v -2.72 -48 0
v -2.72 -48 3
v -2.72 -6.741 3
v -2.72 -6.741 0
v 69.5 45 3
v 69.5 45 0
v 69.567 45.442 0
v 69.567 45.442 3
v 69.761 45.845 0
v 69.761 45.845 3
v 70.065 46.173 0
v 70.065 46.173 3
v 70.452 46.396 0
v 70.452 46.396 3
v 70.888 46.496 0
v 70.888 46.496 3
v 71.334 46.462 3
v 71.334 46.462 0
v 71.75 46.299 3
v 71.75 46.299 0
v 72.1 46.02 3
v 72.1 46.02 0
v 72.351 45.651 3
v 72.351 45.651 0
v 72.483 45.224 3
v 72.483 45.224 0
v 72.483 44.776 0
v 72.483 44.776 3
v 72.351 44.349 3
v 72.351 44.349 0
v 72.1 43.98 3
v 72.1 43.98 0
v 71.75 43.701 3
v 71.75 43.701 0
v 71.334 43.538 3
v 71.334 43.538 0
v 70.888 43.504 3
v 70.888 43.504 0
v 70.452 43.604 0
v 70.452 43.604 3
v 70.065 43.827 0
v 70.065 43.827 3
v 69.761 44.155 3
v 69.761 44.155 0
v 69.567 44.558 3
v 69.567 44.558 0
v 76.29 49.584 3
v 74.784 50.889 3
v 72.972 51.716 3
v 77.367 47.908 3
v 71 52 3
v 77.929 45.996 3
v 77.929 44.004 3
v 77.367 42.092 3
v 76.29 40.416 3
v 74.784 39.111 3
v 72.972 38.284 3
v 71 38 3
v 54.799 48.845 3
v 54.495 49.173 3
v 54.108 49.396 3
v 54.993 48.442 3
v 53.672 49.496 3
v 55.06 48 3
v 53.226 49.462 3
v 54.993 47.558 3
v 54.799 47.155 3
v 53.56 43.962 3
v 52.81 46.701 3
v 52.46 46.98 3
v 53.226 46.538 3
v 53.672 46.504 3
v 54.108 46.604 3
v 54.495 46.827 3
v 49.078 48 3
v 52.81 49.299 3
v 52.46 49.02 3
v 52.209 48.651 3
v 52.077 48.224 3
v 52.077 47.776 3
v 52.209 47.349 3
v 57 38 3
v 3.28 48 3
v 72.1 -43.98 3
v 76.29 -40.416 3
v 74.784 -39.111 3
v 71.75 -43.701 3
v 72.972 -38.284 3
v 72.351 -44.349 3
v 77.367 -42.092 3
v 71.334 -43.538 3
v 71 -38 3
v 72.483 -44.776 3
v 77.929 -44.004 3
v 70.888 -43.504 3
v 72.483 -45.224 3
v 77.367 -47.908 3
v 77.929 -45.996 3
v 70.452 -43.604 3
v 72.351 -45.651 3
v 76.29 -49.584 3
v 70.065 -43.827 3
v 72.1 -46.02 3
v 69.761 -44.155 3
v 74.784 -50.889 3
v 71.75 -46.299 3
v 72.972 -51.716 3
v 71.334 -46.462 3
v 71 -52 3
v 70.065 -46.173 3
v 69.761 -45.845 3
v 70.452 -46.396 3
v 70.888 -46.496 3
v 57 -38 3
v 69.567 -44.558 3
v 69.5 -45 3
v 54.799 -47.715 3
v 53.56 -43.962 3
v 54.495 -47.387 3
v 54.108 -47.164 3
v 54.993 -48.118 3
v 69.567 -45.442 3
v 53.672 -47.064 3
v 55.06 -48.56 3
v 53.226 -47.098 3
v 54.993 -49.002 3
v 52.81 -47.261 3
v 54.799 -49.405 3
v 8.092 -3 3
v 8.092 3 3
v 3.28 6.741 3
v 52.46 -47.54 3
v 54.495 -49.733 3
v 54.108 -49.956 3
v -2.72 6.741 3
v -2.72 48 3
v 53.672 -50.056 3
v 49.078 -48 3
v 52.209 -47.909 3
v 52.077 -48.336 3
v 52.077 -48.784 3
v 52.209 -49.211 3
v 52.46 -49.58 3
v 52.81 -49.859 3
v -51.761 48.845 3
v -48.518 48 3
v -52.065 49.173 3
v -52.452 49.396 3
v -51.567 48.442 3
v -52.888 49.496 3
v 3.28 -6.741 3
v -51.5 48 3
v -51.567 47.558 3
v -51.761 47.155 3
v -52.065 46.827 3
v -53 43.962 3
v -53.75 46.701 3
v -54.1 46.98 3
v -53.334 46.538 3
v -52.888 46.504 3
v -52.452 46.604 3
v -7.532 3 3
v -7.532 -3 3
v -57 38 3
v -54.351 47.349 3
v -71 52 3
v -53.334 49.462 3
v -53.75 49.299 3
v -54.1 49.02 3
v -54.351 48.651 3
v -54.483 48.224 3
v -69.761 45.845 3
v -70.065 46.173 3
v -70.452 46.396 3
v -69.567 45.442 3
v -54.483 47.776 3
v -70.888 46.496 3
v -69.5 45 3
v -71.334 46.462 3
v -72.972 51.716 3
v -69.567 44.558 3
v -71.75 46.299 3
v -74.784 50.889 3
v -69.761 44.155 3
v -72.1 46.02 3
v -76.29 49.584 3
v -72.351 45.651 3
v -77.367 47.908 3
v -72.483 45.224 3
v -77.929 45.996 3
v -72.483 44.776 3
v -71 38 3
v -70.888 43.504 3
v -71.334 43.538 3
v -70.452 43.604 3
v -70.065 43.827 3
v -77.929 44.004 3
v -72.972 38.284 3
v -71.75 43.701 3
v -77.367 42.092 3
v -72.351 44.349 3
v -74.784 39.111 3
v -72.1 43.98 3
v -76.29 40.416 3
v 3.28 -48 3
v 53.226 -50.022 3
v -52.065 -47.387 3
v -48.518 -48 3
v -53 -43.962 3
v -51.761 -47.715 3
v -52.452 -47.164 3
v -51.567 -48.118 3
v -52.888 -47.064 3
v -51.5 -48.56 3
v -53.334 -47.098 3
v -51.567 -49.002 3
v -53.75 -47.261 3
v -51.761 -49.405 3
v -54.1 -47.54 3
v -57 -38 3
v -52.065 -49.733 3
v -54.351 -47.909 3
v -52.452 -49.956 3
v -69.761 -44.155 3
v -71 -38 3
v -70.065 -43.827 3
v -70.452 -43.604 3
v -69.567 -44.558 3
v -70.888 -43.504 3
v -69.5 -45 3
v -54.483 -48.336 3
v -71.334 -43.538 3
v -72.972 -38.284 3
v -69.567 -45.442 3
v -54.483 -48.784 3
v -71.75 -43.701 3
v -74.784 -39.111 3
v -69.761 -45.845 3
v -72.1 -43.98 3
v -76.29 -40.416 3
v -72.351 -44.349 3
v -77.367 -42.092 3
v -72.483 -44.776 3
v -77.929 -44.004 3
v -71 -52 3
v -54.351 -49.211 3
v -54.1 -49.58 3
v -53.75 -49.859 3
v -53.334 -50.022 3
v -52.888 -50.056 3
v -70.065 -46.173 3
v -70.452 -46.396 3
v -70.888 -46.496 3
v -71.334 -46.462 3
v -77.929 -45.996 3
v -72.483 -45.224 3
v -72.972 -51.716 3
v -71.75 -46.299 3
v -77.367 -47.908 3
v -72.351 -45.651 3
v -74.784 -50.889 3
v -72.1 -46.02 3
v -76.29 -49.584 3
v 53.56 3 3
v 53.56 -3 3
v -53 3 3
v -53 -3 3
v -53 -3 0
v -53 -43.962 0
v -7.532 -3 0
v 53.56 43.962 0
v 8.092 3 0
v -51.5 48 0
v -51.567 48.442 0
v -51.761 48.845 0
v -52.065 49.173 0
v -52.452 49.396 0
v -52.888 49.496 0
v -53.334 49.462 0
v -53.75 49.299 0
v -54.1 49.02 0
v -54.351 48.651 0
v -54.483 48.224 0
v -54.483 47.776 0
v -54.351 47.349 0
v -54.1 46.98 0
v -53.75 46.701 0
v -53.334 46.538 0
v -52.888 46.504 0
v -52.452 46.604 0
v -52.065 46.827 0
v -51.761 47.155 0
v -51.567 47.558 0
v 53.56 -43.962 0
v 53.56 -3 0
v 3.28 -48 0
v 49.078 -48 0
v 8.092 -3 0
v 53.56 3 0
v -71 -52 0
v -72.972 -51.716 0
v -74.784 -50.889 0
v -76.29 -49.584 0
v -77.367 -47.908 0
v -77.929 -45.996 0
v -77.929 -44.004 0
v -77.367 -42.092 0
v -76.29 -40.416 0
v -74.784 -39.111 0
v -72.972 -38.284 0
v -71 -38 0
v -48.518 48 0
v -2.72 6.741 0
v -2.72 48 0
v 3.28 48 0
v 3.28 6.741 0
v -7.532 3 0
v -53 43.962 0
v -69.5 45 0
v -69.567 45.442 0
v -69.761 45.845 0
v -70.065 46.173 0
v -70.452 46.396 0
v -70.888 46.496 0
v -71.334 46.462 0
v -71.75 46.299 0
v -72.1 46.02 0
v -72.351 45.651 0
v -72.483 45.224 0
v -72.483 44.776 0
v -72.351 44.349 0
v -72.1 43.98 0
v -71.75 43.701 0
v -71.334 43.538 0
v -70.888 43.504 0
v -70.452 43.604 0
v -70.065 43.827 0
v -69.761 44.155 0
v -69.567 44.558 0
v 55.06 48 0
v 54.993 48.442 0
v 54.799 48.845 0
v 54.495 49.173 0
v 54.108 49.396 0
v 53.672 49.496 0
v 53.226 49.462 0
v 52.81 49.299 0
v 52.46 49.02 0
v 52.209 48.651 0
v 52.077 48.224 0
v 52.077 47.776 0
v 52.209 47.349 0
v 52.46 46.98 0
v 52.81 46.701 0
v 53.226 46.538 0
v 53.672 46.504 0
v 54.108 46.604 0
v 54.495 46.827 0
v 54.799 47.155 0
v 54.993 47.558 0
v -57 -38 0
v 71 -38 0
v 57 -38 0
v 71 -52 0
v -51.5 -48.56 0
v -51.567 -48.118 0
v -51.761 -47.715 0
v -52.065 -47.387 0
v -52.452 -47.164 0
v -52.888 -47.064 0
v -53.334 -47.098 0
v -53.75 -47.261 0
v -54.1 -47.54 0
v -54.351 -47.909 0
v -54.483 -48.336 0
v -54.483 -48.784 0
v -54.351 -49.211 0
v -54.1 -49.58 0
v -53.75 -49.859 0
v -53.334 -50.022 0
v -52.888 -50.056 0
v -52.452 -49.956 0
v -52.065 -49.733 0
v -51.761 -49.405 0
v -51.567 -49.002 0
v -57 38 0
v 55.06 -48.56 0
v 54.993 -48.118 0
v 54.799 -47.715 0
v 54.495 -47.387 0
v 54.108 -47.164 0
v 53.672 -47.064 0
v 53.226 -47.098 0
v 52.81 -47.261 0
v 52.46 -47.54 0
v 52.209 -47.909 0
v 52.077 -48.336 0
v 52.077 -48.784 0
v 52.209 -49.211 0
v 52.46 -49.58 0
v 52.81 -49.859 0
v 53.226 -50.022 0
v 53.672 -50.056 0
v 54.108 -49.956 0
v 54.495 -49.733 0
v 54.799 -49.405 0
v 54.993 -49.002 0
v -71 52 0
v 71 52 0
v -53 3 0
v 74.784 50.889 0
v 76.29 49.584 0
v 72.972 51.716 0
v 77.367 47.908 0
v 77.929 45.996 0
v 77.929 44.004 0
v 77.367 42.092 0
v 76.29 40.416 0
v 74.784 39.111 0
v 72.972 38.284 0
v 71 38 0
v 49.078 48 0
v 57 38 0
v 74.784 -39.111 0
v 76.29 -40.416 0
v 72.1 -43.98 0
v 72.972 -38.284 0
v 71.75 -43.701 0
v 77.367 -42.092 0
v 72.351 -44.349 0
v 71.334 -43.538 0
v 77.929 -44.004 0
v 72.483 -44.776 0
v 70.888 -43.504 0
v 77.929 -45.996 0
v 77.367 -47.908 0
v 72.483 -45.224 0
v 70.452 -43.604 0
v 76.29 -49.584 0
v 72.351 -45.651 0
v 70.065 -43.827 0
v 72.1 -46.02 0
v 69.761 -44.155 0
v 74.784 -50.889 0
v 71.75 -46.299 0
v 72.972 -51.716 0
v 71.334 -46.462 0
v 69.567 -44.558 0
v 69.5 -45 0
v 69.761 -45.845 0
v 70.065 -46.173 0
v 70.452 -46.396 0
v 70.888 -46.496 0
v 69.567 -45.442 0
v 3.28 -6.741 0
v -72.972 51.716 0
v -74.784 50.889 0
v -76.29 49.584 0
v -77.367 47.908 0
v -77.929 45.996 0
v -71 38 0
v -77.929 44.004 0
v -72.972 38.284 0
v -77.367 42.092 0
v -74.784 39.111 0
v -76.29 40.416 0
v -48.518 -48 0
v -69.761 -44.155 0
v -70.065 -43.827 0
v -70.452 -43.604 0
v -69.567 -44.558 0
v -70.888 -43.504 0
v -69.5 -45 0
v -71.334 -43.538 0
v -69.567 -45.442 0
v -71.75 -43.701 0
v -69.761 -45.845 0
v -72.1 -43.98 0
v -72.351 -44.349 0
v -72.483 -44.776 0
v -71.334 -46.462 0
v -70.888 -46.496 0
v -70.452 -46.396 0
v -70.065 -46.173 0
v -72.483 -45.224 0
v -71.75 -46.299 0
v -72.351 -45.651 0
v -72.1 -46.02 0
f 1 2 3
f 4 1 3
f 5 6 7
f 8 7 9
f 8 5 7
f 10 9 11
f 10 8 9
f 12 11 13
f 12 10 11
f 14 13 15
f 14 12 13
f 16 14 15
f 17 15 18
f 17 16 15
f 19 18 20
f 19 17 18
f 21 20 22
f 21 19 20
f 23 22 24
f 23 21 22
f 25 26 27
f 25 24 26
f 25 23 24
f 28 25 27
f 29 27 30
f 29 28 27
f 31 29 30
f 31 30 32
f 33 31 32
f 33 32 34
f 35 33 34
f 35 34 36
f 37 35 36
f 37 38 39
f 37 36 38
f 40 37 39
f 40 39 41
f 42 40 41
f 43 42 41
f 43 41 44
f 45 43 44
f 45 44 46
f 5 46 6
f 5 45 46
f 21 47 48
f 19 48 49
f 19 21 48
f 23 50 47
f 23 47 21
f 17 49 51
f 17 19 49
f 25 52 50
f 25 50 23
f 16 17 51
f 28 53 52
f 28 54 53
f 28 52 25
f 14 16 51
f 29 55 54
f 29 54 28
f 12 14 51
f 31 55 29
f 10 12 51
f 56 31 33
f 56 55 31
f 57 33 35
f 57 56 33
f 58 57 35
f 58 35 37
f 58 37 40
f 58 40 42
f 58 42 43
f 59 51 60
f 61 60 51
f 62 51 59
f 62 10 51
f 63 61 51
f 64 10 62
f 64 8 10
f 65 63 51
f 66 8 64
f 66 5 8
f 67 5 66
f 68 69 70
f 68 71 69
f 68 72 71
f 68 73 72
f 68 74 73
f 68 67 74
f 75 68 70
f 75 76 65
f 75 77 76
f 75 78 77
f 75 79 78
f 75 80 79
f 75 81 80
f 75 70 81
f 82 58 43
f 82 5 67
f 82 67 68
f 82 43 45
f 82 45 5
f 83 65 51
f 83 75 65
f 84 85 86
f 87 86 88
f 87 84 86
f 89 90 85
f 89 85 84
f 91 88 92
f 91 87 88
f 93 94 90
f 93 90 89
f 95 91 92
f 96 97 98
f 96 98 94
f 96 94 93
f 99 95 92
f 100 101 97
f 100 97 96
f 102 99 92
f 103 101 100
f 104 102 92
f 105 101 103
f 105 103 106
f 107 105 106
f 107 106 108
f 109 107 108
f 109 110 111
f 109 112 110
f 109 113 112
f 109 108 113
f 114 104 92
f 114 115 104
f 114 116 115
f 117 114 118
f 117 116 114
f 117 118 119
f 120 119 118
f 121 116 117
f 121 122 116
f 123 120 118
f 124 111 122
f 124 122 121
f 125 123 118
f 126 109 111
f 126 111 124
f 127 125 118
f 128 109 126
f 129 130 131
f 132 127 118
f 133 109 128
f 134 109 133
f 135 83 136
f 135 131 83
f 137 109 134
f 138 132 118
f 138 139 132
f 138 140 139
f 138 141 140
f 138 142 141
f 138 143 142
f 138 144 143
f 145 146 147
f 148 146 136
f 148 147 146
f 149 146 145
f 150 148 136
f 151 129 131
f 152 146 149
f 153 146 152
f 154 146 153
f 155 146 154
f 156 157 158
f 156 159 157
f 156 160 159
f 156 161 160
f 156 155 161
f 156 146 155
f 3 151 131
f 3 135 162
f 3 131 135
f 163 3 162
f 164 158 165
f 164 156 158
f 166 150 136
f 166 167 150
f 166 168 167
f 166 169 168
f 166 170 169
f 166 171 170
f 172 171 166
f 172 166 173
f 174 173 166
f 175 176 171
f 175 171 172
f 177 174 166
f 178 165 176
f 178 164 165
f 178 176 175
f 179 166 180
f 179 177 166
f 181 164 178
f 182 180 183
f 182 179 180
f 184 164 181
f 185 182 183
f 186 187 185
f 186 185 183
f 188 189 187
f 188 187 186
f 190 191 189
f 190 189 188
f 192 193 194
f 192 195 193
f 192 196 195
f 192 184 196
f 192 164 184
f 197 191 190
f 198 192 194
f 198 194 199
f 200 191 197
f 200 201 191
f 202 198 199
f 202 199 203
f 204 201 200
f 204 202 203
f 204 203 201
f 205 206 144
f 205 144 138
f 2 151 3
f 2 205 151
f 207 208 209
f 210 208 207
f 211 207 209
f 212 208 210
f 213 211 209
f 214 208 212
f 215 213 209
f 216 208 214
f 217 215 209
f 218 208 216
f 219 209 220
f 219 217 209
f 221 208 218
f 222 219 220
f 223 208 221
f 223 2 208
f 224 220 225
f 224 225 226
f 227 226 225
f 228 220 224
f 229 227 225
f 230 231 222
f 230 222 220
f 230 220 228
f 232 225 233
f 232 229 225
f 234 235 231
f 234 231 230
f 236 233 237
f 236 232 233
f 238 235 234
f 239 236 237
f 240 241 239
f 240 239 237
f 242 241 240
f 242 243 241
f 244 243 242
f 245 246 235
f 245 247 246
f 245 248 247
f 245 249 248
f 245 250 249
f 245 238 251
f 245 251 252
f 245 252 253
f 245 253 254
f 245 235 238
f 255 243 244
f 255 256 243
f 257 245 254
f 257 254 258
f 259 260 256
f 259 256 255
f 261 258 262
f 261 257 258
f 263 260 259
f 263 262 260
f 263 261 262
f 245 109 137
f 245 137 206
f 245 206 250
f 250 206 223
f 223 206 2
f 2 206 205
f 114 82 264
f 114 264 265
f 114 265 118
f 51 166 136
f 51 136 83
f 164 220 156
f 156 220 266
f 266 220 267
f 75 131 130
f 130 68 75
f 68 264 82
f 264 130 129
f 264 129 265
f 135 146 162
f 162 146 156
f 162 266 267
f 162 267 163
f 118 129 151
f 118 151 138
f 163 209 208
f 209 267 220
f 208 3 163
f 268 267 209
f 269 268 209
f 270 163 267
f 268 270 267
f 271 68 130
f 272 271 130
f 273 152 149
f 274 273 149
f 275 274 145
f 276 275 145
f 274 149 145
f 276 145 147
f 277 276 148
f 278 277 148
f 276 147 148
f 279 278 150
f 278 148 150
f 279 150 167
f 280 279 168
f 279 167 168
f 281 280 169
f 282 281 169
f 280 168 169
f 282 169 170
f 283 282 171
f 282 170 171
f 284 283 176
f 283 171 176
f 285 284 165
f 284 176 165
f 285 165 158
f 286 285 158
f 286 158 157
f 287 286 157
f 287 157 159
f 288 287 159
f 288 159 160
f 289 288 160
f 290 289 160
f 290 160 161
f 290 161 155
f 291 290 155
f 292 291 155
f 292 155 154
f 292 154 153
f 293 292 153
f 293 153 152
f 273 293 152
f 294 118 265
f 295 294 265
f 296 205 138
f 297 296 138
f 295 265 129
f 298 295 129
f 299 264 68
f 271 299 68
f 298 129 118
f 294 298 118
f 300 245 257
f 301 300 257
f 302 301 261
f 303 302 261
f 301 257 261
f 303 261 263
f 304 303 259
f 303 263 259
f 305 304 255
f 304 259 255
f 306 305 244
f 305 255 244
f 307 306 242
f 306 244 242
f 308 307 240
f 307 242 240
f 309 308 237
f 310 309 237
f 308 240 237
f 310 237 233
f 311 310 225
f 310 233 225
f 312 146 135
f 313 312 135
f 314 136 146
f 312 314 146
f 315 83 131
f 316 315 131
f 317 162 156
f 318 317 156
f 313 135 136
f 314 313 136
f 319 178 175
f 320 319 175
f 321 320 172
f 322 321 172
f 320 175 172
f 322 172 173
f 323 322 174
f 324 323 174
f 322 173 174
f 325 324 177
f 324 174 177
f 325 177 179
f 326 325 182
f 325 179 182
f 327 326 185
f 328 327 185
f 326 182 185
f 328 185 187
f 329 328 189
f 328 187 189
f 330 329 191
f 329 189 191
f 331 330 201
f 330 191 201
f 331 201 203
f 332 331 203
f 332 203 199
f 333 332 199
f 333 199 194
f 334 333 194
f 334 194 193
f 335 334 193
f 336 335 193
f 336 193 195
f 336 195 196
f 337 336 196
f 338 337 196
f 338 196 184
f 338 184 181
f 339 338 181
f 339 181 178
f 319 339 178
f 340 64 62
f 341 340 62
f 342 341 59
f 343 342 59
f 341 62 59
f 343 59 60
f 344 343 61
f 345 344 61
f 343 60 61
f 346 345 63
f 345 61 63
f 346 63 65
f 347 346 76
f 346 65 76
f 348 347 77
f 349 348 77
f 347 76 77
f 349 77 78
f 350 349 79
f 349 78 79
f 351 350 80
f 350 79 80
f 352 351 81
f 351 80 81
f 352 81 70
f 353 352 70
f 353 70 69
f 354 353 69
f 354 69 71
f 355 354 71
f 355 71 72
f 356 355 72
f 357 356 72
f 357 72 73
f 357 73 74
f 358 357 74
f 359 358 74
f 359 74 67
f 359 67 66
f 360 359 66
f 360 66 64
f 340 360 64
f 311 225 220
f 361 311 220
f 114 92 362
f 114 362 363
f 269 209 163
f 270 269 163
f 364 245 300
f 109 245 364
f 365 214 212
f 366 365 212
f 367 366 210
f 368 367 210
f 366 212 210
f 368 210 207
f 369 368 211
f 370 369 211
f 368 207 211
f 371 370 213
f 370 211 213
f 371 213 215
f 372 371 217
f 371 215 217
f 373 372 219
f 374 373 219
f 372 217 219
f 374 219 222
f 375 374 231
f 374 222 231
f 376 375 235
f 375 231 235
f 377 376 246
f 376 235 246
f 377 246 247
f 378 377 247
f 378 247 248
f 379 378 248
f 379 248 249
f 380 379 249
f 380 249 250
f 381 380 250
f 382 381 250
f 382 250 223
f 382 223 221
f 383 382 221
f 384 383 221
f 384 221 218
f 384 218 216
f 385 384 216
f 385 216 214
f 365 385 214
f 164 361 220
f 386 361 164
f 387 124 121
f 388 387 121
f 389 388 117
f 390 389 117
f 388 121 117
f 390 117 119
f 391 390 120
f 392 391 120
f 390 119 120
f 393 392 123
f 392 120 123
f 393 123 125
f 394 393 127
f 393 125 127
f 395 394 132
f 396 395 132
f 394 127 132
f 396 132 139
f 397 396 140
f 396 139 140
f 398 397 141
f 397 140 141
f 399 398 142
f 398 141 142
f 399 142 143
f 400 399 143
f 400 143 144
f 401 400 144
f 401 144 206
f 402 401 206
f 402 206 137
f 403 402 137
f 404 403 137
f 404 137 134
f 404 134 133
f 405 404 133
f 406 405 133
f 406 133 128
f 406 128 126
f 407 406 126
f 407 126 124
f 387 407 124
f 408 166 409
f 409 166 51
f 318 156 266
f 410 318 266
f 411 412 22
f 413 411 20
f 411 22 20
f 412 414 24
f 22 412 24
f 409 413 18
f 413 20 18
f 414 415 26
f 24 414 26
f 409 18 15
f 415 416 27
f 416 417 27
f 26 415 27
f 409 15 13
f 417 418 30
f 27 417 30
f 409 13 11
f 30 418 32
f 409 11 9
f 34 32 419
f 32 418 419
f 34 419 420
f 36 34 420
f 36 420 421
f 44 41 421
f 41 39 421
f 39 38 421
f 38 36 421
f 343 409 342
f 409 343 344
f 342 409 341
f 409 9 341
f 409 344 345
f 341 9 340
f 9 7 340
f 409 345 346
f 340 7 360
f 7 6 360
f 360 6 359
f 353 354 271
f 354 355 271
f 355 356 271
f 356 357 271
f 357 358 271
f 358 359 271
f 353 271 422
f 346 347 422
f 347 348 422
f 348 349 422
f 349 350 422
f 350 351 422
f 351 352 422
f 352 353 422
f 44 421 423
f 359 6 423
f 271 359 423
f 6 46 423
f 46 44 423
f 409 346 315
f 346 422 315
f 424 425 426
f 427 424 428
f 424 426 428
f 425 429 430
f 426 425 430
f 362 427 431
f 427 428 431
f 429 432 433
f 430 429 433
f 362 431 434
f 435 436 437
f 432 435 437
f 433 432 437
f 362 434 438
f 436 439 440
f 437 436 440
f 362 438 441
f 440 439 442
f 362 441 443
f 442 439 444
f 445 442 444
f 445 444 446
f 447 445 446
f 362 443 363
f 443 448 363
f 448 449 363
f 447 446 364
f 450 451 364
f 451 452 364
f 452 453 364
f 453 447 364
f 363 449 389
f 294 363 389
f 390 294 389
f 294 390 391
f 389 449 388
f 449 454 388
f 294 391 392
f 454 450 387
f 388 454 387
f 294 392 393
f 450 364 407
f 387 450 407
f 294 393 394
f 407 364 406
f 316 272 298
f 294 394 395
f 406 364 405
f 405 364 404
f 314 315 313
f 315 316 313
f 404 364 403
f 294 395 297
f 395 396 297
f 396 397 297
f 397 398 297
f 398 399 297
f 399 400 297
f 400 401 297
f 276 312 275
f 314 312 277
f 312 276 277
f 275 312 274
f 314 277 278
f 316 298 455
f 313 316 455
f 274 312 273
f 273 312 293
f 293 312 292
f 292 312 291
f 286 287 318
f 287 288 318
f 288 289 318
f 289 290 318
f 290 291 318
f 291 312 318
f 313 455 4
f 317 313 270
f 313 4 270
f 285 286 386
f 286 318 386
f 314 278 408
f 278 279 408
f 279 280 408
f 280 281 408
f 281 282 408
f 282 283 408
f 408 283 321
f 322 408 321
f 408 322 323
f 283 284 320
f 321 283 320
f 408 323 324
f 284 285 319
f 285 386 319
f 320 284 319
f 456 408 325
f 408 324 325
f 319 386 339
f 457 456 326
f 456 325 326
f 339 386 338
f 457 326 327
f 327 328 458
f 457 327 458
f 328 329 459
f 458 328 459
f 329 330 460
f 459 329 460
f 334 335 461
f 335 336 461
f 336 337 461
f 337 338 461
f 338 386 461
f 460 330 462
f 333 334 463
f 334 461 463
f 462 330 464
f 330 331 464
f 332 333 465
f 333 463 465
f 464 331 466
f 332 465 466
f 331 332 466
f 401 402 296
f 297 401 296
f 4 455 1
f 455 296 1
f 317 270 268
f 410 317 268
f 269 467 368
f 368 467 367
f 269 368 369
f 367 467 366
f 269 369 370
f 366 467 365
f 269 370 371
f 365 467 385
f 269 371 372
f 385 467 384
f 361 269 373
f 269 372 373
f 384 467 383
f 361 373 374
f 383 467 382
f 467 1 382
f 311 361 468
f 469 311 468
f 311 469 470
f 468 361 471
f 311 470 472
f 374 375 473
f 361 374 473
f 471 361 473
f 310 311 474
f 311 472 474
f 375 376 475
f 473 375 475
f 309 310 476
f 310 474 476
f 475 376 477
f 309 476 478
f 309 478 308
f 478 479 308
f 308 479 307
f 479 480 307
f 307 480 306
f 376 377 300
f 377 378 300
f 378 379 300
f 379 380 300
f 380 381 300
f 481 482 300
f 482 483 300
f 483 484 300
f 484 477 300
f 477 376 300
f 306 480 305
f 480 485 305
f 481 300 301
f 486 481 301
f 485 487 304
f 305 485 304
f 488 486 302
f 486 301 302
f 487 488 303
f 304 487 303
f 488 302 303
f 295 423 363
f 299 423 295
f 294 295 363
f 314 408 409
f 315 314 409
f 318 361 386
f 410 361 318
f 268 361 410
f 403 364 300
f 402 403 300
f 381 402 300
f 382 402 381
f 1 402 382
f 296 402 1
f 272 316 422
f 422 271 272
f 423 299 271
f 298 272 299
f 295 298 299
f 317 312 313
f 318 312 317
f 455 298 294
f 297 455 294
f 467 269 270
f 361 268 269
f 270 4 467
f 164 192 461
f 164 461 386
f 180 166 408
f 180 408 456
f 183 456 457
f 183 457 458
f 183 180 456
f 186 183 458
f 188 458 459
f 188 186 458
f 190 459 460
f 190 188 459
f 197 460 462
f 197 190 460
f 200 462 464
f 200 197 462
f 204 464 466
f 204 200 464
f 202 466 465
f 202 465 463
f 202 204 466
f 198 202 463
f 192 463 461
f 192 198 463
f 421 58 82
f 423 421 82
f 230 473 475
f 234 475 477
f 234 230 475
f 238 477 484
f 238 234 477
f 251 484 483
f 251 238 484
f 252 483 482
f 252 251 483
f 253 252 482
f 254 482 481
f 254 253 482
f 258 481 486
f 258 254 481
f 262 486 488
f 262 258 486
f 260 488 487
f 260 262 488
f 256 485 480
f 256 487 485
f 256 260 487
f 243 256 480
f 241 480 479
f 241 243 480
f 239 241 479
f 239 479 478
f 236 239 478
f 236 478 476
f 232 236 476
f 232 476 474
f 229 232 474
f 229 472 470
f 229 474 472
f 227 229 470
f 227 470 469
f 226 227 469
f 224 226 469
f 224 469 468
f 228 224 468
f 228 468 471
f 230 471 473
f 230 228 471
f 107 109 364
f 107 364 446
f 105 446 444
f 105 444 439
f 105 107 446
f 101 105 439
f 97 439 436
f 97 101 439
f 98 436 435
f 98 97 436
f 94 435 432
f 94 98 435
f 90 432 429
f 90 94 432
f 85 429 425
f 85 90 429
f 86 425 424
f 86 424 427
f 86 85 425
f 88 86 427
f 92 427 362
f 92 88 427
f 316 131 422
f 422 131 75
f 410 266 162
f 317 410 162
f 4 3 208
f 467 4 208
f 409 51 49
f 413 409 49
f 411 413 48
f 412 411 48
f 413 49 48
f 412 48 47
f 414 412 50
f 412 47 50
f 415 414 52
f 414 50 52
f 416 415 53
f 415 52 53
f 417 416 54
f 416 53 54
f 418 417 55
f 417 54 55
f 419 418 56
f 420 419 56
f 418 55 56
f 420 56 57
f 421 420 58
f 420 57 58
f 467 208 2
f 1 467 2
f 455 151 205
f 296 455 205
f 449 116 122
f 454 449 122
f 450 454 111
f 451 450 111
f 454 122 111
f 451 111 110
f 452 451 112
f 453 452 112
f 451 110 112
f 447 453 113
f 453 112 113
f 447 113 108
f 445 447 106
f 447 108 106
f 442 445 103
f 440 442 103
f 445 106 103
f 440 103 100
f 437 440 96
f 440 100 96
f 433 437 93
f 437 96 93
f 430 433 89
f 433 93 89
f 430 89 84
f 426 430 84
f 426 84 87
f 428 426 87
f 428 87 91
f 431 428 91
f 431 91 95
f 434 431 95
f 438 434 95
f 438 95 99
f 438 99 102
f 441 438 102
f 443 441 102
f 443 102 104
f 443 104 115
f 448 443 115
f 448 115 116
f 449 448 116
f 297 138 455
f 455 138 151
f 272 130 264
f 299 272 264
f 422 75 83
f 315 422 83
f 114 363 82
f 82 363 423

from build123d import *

# Parameters (mm, degrees)
SKETCH3_W                                  = 114
SKETCH3_H                                  = 104
BOSS_EXTRUDE1_DEPTH                        = 3
SKETCH4_R                                  = 1.5
CUT_EXTRUDE1_DEPTH                         = 78.21398837
LPATTERN1_COUNT                            = 2
LPATTERN1_PITCH                            = 106.56
LPATTERN1_COUNT_DIR2                       = 2
LPATTERN1_PITCH_DIR2                       = 96.56
BOSS_EXTRUDE2_DEPTH                        = 3
SKETCH6_R                                  = 1.5
CUT_EXTRUDE2_DEPTH                         = 94.79232378
MIRROR1_AT_THE_SECOND_PLANE_COPY_1_DEPTH   = 3
MIRROR1_AT_THE_SECOND_PLANE_COPY_2_SKETC_R = 1.5
MIRROR1_AT_THE_SECOND_PLANE_COPY_2_DEPTH   = 94.79232378
CUT_EXTRUDE3_DEPTH                         = 94.79232378


with BuildPart() as part:
    # Sketch3 → Boss-Extrude1 (new body)
    with BuildSketch(Plane.XY):
        Rectangle(SKETCH3_W, SKETCH3_H)
    extrude(amount=BOSS_EXTRUDE1_DEPTH)

    # Sketch4 → Cut-Extrude1 (cut, through all)
    with BuildSketch(Plane.XY.offset(3)):
        with Locations((-53, 48)):
            Circle(SKETCH4_R)
    cut_extrude1 = extrude(amount=-CUT_EXTRUDE1_DEPTH, mode=Mode.SUBTRACT)

    # LPattern1: Cut-Extrude1 2 × 2
    with Locations(*[(i * LPATTERN1_PITCH, -j * LPATTERN1_PITCH_DIR2, 0) for i in range(LPATTERN1_COUNT) for j in range(LPATTERN1_COUNT_DIR2) if (i, j) != (0, 0)]):
        add(cut_extrude1, mode=Mode.SUBTRACT)

    # Sketch5 → Boss-Extrude2 (add)
    with BuildSketch(Plane.XY.offset(3)):
        with BuildLine():
            Line((-57, 52), (-71, 52))
            ThreePointArc((-71, 52), (-78, 45), (-71, 38))
            Line((-71, 38), (-57, 38))
            Line((-57, 38), (-57, 52))
        make_face()
    boss_extrude2 = extrude(amount=-BOSS_EXTRUDE2_DEPTH)

    # Sketch6 → Cut-Extrude2 (cut, through all)
    with BuildSketch(Plane.XY.offset(3)):
        with Locations((-71, 45)):
            Circle(SKETCH6_R)
    cut_extrude2 = extrude(amount=-CUT_EXTRUDE2_DEPTH, mode=Mode.SUBTRACT)

    # Mirror1: Boss-Extrude2, Cut-Extrude2 across plane
    add(boss_extrude2.mirror(Plane.ZX))
    add(cut_extrude2.mirror(Plane.ZX), mode=Mode.SUBTRACT)

    # Mirror1 at the second plane: Boss-Extrude2, Cut-Extrude2 across plane
    add(boss_extrude2.mirror(Plane(origin=(0, 0, 0), x_dir=(0, 0, 1), z_dir=(1, 0, 0))))
    add(cut_extrude2.mirror(Plane(origin=(0, 0, 0), x_dir=(0, 0, 1), z_dir=(1, 0, 0))), mode=Mode.SUBTRACT)

    # Mirror1 at the second plane copy 1 sketc → Mirror1 at the second plane copy 1 (add)
    with BuildSketch(Plane(origin=(0, 0, 3), x_dir=(-1, 0, 0), z_dir=(0, 0, 1))):
        with BuildLine():
            Line((-57, 52), (-71, 52))
            ThreePointArc((-71, 52), (-78, 45), (-71, 38))
            Line((-71, 38), (-57, 38))
            Line((-57, 38), (-57, 52))
        make_face()
    extrude(amount=-MIRROR1_AT_THE_SECOND_PLANE_COPY_1_DEPTH)

    # Mirror1 at the second plane copy 2 sketc → Mirror1 at the second plane copy 2 (cut, through all)
    with BuildSketch(Plane(origin=(0, 0, 3), x_dir=(-1, 0, 0), z_dir=(0, 0, 1))):
        with Locations((-71, 45)):
            Circle(MIRROR1_AT_THE_SECOND_PLANE_COPY_2_SKETC_R)
    extrude(amount=-MIRROR1_AT_THE_SECOND_PLANE_COPY_2_DEPTH, mode=Mode.SUBTRACT)

    # Sketch7 → Cut-Extrude3 (cut, through all)
    with BuildSketch(Plane.XY.offset(3)):
        Polygon((-2.72, -48), (-2.72, -6.740598429), (-48.517935743, -48), align=None)
        Polygon((49.077935743, -48), (3.28, -6.740598429), (3.28, -48), align=None)
        Polygon((53.56, -3), (8.092064257, -3), (53.56, -43.962104273), align=None)
        Polygon((53.56, 43.962104273), (8.092064257, 3), (53.56, 3), align=None)
        Polygon((3.28, 48), (3.28, 6.740598429), (49.077935743, 48), align=None)
        Polygon((-48.517935743, 48), (-2.72, 6.740598429), (-2.72, 48), align=None)
        Polygon((-53, 43.962104273), (-53, 3), (-7.532064257, 3), align=None)
        Polygon((-7.532064257, -3), (-53, -3), (-53, -43.962104273), align=None)
    extrude(amount=-CUT_EXTRUDE3_DEPTH, mode=Mode.SUBTRACT)


solid = part.part
